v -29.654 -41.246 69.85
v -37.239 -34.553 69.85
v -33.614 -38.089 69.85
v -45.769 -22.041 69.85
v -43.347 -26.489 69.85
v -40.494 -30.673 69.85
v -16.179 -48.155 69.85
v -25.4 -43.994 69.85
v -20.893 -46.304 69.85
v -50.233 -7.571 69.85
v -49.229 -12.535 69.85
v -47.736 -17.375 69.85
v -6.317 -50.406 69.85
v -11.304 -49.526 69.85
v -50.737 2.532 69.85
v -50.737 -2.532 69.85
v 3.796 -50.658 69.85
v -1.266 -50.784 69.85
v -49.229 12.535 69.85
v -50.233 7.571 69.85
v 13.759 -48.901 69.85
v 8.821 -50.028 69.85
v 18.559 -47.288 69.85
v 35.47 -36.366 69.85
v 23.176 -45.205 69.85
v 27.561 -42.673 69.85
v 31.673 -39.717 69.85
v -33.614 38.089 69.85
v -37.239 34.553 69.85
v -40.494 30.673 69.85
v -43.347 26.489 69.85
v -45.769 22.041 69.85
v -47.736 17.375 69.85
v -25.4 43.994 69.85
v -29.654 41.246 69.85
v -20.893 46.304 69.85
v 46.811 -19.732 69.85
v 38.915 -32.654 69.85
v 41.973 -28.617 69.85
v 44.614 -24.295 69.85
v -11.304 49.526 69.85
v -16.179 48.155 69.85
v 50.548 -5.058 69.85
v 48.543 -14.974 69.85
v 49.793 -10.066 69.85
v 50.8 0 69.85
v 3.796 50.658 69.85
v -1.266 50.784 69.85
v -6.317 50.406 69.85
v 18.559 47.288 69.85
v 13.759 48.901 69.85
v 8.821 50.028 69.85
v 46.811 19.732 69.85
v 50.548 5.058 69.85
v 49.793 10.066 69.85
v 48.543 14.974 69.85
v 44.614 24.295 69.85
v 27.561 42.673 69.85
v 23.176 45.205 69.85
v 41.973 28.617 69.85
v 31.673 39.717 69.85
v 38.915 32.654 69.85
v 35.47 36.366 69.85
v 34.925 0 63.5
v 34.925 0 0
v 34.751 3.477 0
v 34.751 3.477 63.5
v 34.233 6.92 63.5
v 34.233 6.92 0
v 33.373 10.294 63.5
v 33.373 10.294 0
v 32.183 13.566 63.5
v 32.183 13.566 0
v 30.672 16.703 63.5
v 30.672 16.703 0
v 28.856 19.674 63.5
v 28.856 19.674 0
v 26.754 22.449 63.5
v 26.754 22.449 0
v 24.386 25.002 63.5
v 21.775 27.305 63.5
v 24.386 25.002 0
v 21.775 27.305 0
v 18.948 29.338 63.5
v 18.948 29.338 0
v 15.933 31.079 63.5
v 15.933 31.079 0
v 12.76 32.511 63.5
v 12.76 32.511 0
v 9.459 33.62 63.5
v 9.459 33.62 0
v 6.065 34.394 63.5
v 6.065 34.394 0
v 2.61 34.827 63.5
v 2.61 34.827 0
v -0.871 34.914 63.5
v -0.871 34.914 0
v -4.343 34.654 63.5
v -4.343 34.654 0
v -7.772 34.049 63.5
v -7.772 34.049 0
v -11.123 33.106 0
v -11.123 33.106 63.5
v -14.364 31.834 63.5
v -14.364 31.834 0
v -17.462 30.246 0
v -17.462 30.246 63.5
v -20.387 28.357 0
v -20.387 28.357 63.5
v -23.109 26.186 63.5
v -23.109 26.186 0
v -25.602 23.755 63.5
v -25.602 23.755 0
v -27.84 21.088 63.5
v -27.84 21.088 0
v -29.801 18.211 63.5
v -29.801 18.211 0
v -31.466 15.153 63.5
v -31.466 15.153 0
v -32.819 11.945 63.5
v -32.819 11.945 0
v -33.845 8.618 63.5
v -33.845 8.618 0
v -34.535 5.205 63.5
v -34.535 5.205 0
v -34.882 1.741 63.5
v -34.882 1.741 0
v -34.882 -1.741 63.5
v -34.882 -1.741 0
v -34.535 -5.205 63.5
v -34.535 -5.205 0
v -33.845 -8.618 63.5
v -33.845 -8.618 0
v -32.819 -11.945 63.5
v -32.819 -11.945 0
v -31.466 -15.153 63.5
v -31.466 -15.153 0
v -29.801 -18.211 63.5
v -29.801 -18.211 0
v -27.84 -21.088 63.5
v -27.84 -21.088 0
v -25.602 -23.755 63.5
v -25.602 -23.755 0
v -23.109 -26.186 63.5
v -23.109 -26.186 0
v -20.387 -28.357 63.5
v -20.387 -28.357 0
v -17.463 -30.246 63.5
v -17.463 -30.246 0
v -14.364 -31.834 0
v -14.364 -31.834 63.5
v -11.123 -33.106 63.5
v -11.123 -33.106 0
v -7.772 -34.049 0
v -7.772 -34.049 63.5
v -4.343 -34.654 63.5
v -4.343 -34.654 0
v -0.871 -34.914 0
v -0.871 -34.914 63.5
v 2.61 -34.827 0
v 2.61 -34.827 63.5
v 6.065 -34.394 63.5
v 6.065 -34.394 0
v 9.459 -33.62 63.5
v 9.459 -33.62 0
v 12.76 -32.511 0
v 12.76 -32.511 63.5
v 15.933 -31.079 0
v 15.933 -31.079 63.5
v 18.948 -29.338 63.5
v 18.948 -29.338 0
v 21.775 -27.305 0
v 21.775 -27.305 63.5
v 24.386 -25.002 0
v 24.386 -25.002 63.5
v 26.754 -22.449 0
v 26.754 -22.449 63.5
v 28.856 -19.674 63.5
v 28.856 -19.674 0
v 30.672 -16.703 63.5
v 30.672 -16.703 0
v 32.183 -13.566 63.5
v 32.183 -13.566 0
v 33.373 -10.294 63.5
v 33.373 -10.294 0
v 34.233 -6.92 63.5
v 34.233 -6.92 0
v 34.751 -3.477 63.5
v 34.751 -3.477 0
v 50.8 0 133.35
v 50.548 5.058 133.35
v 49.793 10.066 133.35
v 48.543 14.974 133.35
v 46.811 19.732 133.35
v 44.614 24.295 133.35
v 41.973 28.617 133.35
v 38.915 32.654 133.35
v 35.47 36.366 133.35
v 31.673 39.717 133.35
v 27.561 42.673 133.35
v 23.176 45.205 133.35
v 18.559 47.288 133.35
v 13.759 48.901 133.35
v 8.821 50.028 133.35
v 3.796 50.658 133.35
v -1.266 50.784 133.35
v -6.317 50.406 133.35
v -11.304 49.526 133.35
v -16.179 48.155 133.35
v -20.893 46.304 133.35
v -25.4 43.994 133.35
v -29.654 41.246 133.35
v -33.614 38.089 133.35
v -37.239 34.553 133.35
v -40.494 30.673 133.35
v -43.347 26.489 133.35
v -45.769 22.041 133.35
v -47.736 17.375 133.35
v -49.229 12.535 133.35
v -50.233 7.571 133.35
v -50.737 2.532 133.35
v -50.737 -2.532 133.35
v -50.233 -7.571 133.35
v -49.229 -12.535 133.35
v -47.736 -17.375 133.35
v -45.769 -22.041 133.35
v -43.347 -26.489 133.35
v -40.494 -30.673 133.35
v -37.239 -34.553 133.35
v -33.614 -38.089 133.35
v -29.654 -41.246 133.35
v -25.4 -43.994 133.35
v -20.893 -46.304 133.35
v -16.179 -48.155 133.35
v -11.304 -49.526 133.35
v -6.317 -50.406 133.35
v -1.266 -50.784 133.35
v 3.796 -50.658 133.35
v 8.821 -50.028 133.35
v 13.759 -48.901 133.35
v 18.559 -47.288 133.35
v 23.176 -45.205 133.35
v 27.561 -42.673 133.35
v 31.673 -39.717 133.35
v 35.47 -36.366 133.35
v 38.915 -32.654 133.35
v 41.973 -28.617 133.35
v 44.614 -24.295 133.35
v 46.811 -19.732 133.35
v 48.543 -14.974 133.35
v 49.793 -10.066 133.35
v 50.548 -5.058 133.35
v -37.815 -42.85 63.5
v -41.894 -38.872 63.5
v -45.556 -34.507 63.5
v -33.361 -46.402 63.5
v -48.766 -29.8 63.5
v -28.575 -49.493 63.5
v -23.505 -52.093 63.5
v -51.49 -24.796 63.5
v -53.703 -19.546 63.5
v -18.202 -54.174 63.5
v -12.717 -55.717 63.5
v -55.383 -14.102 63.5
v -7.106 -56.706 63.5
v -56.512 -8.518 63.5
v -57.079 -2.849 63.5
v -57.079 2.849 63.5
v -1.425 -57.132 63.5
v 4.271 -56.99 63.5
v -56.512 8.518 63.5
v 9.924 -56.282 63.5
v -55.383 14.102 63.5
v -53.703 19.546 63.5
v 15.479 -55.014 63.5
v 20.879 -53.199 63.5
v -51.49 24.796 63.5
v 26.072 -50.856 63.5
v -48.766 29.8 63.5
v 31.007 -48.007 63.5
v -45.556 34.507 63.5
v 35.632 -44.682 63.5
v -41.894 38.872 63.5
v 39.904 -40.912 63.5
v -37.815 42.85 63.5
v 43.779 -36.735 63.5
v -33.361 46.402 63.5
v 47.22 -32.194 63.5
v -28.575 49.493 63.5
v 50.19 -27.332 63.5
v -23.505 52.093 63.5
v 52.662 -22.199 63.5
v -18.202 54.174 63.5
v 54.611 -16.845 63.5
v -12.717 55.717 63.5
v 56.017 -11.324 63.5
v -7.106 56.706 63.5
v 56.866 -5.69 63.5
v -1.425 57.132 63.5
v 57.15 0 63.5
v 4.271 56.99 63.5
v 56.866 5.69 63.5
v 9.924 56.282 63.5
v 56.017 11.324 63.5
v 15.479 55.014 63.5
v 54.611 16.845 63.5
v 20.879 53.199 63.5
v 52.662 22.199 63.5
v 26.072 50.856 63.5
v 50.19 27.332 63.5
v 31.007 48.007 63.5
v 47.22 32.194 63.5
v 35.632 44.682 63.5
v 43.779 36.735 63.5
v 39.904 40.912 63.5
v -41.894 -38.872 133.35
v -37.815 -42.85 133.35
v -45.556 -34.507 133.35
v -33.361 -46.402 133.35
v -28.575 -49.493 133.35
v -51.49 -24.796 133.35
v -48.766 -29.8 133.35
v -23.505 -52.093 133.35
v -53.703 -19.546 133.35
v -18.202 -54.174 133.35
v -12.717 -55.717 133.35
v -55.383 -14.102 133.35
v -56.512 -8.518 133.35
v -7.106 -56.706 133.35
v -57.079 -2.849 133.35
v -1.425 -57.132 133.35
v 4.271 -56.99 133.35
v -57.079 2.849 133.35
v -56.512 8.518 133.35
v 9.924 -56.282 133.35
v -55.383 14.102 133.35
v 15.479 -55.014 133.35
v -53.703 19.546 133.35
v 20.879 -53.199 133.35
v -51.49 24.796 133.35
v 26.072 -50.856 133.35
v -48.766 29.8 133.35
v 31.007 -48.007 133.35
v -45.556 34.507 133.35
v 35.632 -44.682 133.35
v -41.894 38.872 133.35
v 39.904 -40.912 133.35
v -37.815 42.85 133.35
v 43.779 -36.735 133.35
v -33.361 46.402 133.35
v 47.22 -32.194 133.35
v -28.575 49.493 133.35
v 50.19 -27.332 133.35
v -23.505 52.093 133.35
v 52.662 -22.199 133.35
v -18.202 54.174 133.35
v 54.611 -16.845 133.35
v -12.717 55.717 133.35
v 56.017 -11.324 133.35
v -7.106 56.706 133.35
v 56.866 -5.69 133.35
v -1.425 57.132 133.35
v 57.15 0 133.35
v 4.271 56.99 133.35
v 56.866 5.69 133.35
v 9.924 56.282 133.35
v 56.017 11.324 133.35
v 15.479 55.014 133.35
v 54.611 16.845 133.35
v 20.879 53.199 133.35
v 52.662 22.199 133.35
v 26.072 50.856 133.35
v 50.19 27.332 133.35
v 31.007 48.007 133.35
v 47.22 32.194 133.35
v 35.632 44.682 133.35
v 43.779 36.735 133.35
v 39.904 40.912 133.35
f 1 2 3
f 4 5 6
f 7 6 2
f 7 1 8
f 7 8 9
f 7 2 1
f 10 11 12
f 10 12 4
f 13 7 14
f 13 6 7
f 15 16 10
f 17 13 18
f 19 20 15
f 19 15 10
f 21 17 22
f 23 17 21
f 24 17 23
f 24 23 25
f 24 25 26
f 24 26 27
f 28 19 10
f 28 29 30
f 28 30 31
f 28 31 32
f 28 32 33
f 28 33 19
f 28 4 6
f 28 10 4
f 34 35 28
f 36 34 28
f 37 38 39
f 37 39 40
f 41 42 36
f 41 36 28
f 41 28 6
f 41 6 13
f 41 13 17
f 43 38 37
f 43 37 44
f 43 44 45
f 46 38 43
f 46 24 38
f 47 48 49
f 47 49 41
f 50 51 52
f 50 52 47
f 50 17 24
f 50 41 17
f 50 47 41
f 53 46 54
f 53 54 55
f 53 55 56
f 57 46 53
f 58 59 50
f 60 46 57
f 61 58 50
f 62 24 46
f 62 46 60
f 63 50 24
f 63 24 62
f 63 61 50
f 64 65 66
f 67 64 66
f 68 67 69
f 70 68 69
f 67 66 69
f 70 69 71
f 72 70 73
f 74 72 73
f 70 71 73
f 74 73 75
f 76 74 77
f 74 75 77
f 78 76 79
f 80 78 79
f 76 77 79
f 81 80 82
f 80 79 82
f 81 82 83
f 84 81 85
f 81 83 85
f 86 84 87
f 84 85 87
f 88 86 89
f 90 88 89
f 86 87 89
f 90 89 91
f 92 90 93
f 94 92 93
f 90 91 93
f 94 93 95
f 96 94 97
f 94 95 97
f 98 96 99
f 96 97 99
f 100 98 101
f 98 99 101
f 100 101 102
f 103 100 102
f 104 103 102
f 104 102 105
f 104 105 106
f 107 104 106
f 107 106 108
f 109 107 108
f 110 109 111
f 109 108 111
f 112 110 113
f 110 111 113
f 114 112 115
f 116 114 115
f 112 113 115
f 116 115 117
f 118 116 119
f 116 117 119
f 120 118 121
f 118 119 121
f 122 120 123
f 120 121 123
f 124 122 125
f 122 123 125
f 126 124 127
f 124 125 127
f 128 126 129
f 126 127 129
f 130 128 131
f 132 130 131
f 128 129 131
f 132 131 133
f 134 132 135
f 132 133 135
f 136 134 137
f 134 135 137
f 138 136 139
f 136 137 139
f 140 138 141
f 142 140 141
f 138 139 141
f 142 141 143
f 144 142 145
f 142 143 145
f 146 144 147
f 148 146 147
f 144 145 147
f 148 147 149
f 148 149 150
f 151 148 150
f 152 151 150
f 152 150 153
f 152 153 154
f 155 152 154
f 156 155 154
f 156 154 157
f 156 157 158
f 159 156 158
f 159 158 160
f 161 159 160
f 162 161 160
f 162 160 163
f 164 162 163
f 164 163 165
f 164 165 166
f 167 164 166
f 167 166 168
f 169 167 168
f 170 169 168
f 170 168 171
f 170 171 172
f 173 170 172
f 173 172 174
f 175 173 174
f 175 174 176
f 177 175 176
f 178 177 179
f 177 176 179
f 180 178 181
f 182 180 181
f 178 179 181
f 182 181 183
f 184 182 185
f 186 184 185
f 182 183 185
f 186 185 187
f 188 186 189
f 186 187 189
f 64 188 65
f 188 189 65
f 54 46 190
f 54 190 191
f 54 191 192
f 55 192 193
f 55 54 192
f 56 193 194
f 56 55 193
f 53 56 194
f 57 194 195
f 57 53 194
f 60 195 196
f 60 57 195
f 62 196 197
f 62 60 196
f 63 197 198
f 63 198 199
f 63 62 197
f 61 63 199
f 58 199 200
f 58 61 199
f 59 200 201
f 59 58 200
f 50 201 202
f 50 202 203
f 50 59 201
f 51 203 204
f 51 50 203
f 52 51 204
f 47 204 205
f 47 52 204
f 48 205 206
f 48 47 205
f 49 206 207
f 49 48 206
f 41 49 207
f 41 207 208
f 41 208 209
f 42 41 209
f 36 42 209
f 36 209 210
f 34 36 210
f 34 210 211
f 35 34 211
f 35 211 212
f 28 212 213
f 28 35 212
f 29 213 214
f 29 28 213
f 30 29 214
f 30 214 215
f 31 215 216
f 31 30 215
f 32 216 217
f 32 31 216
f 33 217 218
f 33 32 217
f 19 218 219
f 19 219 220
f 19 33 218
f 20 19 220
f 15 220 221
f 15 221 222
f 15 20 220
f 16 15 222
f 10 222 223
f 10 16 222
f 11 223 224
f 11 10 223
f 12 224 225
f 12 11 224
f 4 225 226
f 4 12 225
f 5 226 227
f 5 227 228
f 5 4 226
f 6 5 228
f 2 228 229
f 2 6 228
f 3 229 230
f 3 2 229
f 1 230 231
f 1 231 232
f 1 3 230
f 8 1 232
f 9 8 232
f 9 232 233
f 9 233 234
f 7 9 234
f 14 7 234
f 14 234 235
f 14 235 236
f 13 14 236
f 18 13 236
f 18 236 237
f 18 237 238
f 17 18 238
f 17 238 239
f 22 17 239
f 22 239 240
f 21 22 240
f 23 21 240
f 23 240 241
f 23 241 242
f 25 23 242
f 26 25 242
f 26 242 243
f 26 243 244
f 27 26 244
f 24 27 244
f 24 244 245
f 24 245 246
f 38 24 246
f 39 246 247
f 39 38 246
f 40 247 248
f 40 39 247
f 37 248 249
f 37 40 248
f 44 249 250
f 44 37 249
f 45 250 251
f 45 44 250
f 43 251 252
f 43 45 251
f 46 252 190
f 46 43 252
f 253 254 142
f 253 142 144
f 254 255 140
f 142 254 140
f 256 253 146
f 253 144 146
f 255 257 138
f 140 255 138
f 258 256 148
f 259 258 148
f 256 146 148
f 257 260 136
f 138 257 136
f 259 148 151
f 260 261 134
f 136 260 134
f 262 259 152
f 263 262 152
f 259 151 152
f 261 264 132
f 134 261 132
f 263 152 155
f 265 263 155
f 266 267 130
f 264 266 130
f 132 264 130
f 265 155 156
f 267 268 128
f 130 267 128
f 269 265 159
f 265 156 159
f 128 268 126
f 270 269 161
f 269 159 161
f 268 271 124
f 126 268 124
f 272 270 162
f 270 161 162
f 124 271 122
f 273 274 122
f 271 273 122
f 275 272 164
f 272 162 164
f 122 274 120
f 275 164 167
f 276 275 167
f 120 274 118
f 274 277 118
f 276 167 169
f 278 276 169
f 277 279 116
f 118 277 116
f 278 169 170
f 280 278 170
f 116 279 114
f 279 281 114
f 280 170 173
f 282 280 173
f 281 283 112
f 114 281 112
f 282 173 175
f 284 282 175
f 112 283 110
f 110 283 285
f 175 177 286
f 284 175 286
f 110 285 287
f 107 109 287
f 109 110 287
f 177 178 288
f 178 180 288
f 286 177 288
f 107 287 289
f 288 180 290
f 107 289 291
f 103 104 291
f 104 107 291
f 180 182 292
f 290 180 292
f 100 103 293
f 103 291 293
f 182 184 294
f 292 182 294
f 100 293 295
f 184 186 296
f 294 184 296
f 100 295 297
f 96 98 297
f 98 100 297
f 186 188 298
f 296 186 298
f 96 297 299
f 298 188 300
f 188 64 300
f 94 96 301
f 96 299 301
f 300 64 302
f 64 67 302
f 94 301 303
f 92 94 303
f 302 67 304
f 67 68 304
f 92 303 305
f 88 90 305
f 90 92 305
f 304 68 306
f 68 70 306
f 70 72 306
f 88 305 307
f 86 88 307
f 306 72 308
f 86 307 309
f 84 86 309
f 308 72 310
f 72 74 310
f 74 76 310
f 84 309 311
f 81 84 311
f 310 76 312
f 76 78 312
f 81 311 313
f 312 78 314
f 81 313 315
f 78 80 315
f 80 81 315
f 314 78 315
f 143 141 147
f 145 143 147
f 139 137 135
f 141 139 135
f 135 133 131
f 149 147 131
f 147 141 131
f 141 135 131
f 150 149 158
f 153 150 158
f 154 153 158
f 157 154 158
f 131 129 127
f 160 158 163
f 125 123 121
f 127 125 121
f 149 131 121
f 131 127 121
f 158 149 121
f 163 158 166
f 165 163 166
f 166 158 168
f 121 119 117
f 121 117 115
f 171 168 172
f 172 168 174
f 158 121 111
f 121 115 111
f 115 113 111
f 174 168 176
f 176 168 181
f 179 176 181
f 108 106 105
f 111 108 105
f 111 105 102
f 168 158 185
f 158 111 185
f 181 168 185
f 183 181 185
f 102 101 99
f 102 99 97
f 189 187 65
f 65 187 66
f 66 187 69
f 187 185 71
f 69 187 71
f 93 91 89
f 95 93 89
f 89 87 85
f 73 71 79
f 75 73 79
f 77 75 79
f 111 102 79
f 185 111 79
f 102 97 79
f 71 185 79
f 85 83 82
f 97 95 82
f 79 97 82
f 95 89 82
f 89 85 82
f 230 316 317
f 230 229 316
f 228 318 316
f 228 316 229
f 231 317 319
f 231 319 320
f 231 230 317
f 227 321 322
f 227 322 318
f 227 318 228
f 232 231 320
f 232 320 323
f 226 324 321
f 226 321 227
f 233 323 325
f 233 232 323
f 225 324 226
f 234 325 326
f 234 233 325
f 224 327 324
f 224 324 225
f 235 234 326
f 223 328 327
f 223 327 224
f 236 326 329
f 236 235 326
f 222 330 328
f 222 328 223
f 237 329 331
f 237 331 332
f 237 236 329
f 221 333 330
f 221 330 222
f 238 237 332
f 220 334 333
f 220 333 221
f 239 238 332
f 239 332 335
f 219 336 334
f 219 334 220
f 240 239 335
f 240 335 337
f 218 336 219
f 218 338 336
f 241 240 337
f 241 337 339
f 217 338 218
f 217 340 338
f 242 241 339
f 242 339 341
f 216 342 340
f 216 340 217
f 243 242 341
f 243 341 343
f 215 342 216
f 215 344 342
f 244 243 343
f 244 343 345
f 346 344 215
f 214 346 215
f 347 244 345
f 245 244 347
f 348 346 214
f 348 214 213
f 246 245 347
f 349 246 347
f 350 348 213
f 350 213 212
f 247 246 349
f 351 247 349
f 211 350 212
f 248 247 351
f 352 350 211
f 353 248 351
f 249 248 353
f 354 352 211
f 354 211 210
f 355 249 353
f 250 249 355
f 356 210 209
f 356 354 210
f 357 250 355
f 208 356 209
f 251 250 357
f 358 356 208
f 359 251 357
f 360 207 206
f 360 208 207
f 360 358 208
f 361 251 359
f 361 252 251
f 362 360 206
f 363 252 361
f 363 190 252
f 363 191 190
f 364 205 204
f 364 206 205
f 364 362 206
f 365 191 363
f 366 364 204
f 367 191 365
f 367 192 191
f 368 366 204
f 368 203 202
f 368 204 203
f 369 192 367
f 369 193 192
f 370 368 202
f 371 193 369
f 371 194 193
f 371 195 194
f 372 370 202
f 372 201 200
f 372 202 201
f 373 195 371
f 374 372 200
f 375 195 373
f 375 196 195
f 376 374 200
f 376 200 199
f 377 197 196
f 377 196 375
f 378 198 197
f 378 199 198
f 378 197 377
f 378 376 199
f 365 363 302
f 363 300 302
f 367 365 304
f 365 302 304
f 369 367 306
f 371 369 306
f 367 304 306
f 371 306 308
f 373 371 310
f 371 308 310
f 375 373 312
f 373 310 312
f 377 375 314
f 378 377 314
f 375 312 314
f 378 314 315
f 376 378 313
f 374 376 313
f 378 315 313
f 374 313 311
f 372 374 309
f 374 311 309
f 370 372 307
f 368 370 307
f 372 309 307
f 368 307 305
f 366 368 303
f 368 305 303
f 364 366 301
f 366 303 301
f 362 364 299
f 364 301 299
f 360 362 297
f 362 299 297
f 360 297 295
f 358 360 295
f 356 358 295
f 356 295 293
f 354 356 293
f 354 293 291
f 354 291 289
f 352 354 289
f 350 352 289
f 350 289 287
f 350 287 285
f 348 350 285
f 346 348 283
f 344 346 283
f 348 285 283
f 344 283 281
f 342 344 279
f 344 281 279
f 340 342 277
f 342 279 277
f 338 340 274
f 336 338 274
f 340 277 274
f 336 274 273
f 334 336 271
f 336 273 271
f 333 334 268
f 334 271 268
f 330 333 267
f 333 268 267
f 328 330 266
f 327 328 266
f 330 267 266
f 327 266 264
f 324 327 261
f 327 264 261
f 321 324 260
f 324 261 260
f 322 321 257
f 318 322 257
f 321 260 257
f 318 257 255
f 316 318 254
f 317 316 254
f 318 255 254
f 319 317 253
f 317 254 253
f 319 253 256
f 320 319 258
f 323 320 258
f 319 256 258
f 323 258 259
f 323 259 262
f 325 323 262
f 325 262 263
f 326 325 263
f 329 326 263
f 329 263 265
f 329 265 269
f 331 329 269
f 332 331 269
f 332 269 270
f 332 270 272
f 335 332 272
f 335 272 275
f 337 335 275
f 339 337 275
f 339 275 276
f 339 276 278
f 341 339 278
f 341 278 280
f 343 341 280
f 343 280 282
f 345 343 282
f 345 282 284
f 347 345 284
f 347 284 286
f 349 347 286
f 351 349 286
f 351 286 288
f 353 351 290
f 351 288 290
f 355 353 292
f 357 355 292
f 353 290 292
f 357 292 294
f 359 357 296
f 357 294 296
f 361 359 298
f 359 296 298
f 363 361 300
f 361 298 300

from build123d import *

# Parameters (mm, degrees)
F0_R     = 34.925
F1_DEPTH = 63.5
F2_R     = 57.15
F2_R_2   = 34.925
F3_DEPTH = 6.35
F4_R     = 57.15
F4_R_2   = 50.8
F5_DEPTH = 63.5


with BuildPart() as f1:
    # F0 (on Top) → F1 (new body)
    with BuildSketch(Plane.XY):
        Circle(F0_R)
    extrude(amount=F1_DEPTH)

    # F2 (on face) → F3 (join)
    with BuildSketch(Plane.XY.offset(63.5)):
        Circle(F2_R)
        Circle(F2_R_2, mode=Mode.SUBTRACT)
        Circle(F2_R_2)
    extrude(amount=F3_DEPTH)

    # F4 (on face) → F5 (join)
    with BuildSketch(Plane.XY.offset(69.85)):
        Circle(F4_R)
        Circle(F4_R_2, mode=Mode.SUBTRACT)
    extrude(amount=F5_DEPTH)


solid = f1.part
